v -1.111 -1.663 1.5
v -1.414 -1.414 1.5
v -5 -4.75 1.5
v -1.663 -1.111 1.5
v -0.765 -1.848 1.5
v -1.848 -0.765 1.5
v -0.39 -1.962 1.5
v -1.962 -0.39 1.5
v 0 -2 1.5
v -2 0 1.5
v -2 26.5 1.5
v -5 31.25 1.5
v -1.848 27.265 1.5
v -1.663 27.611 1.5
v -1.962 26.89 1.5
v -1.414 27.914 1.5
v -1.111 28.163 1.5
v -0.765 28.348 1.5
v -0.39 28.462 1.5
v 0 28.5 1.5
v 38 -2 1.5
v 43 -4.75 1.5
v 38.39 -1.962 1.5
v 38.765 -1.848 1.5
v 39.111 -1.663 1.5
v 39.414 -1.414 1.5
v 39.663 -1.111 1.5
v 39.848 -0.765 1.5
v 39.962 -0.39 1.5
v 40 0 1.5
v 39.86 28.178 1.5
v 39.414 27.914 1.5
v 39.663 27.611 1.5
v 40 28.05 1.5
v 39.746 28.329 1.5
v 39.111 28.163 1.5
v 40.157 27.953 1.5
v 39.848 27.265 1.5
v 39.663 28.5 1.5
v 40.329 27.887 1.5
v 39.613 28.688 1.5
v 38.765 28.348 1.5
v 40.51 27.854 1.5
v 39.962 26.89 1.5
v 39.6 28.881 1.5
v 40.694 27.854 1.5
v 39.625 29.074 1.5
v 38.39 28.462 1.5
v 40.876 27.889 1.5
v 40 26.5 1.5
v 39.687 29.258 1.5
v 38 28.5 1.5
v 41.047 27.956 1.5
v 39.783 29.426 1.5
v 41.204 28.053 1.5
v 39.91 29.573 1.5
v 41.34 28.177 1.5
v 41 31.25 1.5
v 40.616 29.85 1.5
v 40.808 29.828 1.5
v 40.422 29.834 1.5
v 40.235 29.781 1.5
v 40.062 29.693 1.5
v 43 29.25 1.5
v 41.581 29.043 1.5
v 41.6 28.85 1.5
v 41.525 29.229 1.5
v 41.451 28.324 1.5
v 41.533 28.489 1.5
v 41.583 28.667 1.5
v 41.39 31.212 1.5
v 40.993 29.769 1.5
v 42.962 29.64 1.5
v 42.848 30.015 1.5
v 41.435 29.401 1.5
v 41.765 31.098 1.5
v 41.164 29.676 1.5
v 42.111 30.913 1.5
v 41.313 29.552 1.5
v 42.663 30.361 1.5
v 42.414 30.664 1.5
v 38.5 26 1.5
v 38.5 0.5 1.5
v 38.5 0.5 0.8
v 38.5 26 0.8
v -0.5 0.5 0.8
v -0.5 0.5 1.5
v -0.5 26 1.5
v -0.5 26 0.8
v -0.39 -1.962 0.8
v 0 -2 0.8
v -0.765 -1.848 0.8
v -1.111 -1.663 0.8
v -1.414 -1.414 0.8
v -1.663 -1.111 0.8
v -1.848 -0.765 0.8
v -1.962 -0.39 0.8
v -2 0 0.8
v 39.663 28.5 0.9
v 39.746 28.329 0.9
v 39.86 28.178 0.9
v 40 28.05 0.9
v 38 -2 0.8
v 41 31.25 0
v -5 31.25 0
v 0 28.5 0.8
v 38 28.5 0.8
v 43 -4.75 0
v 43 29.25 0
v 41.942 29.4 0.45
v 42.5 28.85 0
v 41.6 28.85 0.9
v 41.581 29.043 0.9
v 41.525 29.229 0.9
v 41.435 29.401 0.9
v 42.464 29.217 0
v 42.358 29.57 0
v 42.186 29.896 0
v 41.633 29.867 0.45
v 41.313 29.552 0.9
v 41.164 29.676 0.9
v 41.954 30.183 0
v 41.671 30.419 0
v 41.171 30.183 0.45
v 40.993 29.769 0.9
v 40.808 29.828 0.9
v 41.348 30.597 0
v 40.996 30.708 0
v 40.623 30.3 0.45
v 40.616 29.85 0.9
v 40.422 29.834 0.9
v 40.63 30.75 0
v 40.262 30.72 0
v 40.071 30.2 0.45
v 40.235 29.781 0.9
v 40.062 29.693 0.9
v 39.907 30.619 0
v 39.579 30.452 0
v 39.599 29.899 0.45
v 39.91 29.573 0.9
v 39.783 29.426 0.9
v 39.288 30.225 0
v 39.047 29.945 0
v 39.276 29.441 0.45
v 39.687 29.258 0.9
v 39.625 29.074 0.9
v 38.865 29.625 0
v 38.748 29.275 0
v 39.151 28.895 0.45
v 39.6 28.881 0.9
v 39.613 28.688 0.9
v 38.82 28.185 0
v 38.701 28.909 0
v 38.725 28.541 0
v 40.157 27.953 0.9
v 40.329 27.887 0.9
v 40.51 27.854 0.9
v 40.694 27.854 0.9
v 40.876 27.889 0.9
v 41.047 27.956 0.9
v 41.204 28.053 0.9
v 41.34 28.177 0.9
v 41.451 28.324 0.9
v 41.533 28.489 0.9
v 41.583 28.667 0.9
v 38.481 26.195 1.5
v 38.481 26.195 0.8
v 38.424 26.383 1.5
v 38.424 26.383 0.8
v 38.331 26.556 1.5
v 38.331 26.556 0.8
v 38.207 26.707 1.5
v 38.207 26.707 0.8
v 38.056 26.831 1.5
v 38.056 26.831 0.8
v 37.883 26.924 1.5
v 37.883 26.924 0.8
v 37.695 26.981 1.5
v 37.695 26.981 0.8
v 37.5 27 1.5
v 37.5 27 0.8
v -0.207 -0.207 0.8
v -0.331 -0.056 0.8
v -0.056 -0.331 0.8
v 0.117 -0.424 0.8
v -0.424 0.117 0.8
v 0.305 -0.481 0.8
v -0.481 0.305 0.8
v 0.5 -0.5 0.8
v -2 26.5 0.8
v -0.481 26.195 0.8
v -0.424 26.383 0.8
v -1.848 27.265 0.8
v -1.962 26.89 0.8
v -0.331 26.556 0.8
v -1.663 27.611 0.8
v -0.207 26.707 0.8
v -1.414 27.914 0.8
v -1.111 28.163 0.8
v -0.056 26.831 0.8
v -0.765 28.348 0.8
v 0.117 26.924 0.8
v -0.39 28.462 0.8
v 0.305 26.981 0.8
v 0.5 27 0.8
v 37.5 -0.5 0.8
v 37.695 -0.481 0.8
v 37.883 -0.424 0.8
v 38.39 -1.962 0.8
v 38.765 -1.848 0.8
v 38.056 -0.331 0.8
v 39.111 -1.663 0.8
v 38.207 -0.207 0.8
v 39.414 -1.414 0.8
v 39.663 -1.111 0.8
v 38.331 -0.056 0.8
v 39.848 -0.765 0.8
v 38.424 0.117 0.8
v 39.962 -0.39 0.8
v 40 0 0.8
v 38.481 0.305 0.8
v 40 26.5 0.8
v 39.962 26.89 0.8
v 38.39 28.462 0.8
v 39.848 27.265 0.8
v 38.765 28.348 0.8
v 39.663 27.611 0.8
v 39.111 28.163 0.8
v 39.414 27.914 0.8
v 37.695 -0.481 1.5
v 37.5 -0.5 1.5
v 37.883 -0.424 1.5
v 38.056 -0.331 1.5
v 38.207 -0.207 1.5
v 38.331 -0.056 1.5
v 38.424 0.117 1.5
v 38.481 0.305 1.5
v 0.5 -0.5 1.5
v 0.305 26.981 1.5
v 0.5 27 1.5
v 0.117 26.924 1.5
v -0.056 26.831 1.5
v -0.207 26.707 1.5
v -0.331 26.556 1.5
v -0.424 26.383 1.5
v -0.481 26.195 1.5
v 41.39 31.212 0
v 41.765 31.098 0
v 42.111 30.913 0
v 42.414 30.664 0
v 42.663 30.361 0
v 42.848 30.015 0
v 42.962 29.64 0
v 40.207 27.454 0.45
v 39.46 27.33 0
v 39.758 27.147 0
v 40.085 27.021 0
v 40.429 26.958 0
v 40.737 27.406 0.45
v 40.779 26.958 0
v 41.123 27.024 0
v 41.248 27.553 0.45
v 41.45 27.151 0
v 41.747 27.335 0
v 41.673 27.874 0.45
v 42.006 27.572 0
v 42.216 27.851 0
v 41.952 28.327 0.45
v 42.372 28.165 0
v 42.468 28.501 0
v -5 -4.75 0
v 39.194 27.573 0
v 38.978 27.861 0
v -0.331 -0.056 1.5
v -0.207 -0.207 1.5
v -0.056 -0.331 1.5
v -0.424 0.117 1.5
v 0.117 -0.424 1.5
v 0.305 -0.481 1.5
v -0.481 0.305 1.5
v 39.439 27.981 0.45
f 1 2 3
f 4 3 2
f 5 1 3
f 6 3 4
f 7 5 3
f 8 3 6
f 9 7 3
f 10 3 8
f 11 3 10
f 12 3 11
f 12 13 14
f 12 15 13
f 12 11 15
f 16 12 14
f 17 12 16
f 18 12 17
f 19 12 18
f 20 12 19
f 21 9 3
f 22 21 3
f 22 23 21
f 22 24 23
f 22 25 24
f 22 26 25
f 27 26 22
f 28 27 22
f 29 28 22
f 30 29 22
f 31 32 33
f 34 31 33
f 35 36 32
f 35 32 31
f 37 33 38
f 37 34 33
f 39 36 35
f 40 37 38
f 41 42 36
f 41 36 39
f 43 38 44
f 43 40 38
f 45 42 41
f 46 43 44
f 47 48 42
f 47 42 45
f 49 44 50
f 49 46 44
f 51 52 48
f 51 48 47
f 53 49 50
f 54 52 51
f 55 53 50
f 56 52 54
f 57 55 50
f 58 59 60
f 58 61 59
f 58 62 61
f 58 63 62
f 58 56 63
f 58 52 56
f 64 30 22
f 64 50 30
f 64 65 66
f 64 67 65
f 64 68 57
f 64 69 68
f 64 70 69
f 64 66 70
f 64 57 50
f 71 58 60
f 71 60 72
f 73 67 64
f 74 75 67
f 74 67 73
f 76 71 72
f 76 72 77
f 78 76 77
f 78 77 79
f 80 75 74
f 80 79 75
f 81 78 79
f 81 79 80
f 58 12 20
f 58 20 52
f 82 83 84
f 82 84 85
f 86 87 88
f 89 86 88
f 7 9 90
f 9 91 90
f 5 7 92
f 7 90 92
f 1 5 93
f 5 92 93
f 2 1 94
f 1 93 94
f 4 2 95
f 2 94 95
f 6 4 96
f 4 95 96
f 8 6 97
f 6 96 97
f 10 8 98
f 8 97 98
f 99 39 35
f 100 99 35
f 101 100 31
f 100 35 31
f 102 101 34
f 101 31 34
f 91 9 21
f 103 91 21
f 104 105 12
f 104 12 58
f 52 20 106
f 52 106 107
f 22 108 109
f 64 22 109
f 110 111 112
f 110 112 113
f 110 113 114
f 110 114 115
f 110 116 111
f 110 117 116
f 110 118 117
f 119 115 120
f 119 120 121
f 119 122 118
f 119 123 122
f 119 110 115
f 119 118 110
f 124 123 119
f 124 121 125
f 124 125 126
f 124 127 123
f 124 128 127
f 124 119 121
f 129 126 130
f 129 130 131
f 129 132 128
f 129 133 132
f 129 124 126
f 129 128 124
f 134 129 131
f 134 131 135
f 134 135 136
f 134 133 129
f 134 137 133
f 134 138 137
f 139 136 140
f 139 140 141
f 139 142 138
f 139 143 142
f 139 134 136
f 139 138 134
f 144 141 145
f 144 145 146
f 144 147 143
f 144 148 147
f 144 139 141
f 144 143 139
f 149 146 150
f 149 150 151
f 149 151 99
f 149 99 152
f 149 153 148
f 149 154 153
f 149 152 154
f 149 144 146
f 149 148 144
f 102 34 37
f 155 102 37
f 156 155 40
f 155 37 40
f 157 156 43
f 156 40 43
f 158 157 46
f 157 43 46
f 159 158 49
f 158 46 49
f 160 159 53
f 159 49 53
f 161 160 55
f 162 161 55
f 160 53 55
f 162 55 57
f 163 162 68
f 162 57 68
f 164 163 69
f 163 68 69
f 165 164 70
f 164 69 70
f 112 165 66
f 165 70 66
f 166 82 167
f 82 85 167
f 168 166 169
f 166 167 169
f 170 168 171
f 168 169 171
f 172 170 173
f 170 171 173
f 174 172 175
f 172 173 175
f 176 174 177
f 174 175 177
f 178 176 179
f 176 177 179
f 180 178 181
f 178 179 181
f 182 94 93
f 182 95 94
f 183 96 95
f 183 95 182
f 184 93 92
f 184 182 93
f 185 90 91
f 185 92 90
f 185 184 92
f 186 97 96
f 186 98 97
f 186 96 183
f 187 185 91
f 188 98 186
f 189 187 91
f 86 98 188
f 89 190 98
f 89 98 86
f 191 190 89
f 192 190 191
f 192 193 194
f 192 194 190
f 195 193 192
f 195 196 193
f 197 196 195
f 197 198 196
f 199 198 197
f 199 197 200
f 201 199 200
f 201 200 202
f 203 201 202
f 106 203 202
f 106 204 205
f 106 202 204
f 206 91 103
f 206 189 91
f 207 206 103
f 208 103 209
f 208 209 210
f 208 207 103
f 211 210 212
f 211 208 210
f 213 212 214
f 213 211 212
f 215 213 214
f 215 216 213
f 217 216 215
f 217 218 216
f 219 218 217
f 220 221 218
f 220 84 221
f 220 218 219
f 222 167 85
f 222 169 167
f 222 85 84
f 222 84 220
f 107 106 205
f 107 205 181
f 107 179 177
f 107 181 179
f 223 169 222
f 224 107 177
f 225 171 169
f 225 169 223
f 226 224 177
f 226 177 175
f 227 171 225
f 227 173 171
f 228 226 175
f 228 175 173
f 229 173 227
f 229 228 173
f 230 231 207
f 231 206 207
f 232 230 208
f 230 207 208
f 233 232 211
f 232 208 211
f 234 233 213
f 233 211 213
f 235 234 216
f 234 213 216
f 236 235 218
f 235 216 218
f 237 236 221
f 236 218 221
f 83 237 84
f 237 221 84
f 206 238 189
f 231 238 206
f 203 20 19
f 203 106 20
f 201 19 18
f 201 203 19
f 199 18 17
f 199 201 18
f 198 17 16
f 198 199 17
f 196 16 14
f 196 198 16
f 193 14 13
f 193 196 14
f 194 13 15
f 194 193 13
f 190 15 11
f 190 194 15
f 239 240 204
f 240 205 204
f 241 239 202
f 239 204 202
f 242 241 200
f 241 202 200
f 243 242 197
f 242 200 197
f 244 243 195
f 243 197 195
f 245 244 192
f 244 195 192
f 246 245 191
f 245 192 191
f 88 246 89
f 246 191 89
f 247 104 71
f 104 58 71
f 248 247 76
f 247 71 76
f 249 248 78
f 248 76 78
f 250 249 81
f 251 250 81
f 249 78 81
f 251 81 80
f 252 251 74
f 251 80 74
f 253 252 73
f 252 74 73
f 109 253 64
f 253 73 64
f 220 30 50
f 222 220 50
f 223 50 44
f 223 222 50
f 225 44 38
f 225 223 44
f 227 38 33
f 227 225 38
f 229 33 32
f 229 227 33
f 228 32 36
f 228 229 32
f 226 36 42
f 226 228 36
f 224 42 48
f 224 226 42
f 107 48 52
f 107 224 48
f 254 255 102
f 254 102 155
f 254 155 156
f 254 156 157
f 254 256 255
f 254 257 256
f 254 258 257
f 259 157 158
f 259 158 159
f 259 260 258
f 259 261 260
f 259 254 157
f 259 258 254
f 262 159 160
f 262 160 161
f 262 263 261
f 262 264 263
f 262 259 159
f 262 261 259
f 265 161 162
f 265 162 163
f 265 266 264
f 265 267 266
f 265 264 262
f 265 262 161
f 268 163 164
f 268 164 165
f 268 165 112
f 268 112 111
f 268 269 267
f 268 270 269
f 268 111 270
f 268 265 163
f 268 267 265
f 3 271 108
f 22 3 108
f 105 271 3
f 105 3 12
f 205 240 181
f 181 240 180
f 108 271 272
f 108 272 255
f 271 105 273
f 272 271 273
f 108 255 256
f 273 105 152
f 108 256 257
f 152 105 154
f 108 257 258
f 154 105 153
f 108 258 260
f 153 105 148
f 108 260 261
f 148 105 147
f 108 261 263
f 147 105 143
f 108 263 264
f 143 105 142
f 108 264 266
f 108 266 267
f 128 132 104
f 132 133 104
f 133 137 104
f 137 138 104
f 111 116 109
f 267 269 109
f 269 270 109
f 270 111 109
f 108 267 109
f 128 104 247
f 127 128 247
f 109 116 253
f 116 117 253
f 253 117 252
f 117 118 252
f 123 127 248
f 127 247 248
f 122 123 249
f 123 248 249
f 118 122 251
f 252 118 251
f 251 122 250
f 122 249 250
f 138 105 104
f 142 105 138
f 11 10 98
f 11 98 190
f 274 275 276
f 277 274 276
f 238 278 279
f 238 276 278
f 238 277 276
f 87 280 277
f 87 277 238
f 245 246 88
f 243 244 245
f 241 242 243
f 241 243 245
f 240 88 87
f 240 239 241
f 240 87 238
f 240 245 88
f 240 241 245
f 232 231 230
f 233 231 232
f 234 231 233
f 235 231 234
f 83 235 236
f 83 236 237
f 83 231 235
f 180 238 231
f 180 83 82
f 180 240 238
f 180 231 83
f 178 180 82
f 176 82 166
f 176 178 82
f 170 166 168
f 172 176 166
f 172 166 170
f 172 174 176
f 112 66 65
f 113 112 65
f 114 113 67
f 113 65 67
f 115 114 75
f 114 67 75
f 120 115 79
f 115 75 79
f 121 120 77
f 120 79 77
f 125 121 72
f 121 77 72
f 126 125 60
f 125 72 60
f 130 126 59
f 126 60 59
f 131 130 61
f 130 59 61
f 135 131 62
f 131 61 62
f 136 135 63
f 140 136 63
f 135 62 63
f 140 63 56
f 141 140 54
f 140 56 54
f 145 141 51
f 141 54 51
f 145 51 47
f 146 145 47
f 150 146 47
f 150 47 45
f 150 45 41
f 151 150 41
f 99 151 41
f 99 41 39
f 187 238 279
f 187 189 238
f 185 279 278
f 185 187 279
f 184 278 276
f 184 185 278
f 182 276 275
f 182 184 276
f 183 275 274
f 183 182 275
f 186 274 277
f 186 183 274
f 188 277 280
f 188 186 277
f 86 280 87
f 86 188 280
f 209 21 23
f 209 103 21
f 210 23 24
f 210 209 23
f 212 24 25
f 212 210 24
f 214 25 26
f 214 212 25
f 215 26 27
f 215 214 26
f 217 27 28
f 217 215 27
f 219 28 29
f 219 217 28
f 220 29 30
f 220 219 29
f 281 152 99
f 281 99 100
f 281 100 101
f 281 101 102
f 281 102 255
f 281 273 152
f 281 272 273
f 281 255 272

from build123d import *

# Parameters (mm, degrees)
F1_W      = 48
F1_H      = 36
F2_DEPTH  = 1.5
F4_W      = 42
F4_H      = 30.5
F4_W_2    = 39
F4_H_2    = 27.5
F6_DEPTH  = 0.7
F7_R      = 2
F8_R      = 1
F9_DEPTH  = 25
F10_SIZE2 = 0.9
F10_SIZE  = 0.9
F11_R     = 2


with BuildPart() as f2:
    # F1 (on Top) → F2 (new body)
    with BuildSketch(Plane.XY):
        with Locations((19, 13.25)):
            Rectangle(F1_W, F1_H)
    extrude(amount=F2_DEPTH)

    # F4 (on face) → F6 (cut)
    with BuildSketch(Plane.XY.offset(1.5)):
        with Locations((19, 13.25)):
            Rectangle(F4_W, F4_H)
        with Locations((19, 13.25)):
            Rectangle(F4_W_2, F4_H_2, mode=Mode.SUBTRACT)
    extrude(amount=-F6_DEPTH, mode=Mode.SUBTRACT)

    # F7
    f7_edges = [f2.edges().sort_by_distance(p)[0] for p in [
        (40, 28.5, 1.15),
        (40, -2, 1.15),
        (-2, 28.5, 1.15),
        (-2, -2, 1.15),
    ]]
    fillet(f7_edges, radius=F7_R)

    # F8
    f8_edges = [f2.edges().sort_by_distance(p)[0] for p in [
        (38.5, 27, 1.15),
        (38.5, -0.5, 1.15),
        (-0.5, -0.5, 1.15),
        (-0.5, 27, 1.15),
    ]]
    fillet(f8_edges, radius=F8_R)

    # F5 (on face) → F9 (cut)
    with BuildSketch(Plane.XY.offset(1.5)):
        with BuildLine():
            Line((40, 28.5), (39.6632503002, 28.5))
            ThreePointArc((39.6632503002, 28.5), (39.7993596875, 28.2508547004), (40, 28.05))
            Line((40, 28.05), (40, 28.5))
        make_face()
        with BuildLine():
            ThreePointArc((41.6, 28.85), (40.4221653855, 29.8340603893), (39.6632503002, 28.5))
            Line((39.6632503002, 28.5), (40, 28.5))
            Line((40, 28.5), (40, 28.05))
            ThreePointArc((40, 28.05), (41.0472135955, 27.955572809), (41.6, 28.85))
        make_face()
    extrude(amount=-F9_DEPTH, mode=Mode.SUBTRACT)

    # F10
    f10_edges = [f2.edges().sort_by_distance(p)[0] for p in [
        (41.2, 29.65, 0),
    ]]
    chamfer(f10_edges, length=F10_SIZE, length2=F10_SIZE2)

    # F11
    f11_edges = [f2.edges().sort_by_distance(p)[0] for p in [
        (43, 31.25, 0.75),
    ]]
    fillet(f11_edges, radius=F11_R)


solid = f2.part
